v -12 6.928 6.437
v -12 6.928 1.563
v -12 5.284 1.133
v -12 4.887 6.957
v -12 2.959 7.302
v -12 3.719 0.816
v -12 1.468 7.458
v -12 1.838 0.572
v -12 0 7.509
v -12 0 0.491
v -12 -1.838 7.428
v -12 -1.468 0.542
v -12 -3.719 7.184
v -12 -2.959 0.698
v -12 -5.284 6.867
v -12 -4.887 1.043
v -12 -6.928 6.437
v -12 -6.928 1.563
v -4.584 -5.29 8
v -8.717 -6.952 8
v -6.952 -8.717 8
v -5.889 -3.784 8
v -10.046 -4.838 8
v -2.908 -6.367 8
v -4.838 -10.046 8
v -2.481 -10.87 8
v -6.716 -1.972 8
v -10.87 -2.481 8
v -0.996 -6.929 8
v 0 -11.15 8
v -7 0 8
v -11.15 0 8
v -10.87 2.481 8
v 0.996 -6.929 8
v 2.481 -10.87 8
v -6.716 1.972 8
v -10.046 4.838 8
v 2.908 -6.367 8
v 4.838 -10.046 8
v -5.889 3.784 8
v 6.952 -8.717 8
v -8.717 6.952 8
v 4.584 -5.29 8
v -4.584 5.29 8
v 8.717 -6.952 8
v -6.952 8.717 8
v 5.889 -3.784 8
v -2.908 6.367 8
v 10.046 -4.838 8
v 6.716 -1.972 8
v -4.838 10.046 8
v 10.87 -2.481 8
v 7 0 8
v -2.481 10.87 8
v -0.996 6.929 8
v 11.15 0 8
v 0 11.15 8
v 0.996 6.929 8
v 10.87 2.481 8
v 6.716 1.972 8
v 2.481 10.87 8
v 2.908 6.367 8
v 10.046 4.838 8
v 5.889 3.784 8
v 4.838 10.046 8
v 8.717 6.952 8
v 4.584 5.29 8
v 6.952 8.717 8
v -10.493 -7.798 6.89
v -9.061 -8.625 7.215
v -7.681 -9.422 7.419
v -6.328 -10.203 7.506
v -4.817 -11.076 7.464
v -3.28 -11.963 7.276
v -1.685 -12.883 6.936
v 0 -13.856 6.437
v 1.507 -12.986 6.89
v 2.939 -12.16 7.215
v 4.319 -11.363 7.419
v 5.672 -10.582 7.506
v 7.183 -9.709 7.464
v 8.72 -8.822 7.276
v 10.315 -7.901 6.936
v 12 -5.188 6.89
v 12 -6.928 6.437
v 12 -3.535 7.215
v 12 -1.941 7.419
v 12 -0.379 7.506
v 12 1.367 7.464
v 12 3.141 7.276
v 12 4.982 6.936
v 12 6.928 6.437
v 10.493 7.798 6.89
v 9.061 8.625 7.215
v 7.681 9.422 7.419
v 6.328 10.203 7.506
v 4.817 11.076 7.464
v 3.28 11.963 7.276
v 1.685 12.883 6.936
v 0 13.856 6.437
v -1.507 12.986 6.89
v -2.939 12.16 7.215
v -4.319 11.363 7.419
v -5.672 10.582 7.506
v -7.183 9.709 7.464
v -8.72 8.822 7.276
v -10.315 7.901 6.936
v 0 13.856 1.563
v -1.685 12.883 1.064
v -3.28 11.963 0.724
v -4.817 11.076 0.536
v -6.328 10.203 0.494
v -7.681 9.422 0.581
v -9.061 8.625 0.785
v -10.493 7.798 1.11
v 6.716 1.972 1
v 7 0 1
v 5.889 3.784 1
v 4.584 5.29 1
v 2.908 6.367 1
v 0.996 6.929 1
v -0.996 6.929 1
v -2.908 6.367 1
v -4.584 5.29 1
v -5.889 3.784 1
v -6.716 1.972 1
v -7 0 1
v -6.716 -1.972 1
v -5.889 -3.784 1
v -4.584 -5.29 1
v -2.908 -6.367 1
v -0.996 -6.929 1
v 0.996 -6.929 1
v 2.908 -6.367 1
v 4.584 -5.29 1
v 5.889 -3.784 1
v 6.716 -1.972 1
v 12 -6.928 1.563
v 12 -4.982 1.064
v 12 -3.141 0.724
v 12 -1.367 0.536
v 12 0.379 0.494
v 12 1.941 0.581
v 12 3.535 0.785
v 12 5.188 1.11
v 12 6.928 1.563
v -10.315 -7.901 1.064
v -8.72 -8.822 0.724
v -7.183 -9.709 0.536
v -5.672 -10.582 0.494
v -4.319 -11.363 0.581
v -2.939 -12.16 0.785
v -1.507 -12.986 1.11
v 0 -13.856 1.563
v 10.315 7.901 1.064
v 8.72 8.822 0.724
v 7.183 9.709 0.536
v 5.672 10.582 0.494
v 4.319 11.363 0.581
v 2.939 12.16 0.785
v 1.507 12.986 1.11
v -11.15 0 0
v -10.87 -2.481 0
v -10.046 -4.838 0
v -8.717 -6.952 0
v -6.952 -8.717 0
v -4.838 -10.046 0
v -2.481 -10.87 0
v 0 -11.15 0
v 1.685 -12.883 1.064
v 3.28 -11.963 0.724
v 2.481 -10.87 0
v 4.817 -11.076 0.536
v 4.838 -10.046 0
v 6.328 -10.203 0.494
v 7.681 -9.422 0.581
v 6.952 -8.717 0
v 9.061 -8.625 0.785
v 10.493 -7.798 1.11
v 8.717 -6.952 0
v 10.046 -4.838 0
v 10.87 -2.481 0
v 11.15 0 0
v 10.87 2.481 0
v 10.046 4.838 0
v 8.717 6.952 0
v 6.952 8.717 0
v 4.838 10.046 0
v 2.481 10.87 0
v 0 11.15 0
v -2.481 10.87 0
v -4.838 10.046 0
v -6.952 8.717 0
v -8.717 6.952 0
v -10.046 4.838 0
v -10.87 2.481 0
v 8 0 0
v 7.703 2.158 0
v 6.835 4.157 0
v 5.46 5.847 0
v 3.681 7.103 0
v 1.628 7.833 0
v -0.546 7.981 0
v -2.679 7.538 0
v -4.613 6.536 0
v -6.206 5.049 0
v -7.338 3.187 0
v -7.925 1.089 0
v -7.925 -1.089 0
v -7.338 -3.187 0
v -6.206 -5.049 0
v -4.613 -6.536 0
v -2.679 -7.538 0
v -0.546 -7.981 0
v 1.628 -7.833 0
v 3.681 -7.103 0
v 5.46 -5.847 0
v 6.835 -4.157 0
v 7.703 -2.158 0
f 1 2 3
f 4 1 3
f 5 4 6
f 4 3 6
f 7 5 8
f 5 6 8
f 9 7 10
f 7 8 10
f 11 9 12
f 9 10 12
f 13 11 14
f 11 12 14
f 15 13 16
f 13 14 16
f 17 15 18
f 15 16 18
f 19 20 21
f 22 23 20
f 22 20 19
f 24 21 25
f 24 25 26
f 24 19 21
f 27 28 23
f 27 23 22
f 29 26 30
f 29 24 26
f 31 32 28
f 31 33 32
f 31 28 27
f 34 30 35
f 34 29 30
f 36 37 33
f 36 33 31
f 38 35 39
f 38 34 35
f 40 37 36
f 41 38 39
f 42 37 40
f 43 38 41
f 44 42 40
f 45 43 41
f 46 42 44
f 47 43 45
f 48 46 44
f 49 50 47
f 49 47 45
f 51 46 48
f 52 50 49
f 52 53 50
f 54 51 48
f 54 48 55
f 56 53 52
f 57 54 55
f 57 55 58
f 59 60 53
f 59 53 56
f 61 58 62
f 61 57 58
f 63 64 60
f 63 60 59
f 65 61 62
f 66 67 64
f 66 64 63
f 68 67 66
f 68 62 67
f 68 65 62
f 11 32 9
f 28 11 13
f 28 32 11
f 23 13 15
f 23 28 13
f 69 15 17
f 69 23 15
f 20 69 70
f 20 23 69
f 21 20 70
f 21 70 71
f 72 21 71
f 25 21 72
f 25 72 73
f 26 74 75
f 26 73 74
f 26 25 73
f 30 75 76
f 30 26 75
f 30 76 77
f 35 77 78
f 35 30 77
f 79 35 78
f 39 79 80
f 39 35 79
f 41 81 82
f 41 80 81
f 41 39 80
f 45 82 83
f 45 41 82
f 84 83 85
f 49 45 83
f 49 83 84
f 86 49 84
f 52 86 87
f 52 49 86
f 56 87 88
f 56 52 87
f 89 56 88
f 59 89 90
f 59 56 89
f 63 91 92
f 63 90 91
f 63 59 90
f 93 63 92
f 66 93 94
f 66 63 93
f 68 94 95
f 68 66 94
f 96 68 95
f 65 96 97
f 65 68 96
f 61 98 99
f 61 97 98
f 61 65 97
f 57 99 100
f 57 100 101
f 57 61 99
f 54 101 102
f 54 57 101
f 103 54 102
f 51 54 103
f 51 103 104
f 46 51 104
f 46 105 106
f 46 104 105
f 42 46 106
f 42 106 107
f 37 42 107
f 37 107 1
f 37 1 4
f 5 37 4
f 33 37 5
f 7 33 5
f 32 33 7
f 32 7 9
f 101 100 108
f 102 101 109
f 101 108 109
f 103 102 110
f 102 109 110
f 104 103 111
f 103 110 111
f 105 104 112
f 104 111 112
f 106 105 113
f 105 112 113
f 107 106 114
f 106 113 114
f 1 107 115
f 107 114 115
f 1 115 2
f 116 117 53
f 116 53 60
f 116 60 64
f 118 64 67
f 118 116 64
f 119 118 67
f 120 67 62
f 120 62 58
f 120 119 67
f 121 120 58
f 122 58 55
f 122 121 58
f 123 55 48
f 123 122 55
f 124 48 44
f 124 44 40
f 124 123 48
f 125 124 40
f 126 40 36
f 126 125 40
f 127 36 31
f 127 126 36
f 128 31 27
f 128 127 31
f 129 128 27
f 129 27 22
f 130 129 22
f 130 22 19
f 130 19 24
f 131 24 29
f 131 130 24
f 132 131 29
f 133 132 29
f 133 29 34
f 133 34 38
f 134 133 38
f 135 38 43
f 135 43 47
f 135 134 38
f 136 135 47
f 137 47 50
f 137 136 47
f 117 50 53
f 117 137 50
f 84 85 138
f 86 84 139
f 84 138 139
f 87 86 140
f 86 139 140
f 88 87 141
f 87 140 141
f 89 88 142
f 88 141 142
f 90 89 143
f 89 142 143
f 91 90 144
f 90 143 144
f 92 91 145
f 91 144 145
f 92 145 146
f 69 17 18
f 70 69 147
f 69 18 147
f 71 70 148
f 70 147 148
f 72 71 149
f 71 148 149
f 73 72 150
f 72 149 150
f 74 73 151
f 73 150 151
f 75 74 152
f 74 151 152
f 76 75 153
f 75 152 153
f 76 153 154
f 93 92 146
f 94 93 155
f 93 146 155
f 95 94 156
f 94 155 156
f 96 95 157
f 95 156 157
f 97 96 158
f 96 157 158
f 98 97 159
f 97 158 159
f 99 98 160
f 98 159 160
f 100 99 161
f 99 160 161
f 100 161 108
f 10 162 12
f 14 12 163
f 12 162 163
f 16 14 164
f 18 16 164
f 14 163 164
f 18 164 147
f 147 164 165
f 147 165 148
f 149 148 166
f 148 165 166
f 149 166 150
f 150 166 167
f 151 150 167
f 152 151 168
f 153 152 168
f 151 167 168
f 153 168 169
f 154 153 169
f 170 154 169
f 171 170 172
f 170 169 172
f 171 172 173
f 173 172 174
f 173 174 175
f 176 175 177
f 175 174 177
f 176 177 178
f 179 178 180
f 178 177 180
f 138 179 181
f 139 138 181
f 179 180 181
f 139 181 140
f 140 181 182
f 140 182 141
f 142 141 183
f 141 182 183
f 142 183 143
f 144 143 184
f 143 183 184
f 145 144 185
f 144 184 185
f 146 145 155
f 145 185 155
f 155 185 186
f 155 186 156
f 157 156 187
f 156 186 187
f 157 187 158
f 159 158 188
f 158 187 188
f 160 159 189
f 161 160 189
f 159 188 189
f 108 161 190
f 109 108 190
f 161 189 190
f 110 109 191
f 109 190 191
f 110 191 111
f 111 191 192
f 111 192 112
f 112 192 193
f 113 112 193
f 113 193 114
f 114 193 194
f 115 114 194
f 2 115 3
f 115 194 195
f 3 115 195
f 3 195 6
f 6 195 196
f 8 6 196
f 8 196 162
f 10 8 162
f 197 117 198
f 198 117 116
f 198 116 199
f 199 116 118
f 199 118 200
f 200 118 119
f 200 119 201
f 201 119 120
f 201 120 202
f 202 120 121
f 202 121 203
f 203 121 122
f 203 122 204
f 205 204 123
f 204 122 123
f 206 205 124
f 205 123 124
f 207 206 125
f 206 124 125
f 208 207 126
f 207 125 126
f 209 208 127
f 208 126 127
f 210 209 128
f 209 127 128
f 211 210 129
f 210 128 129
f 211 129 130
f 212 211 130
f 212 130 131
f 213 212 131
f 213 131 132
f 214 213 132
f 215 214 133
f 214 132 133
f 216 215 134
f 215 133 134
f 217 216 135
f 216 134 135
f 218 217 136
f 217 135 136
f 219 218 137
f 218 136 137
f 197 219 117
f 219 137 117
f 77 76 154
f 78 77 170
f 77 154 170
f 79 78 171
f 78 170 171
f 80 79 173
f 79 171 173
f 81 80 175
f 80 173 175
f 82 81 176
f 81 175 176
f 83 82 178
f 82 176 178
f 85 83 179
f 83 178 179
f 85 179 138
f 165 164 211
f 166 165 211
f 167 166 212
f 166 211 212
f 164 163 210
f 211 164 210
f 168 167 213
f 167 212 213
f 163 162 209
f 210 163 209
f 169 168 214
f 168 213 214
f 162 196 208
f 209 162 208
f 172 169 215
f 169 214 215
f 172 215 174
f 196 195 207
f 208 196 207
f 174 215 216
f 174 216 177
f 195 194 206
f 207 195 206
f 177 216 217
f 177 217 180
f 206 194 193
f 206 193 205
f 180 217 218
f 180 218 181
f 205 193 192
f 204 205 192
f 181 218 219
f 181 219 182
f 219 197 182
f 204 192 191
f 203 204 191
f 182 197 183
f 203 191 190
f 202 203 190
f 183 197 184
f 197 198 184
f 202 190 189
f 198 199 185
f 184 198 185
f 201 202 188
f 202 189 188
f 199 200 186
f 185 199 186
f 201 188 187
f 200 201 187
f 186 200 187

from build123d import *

# Parameters (mm, degrees)
SKETCH_1_R      = 7
EXTRUDE_1_DEPTH = 8
CHAMFER_1_SIZE  = 1


with BuildPart() as part:
    # Эскиз1 → Бобышка-Вытянуть1 (new body)
    with BuildSketch(Plane.XY):
        Polygon((0, 13.856406461), (-12, 6.92820323), (-12, -6.92820323), (0, -13.856406461), (12, -6.92820323), (12, 6.92820323), align=None)
        Circle(SKETCH_1_R, mode=Mode.SUBTRACT)
    extrude(amount=EXTRUDE_1_DEPTH)

    # Эскиз2 → Вырез-Повернуть1 (revolve, cut)
    with BuildSketch(Plane(origin=(0, 0, 0), x_dir=(0, 0, -1), z_dir=(1, 0, 0)), mode=Mode.PRIVATE) as cut_revolve_1_sk:
        Polygon((0, 13.856406461), (-1.562544499, 13.856406461), (0, 11.15), align=None)
        Polygon((-8, 11.15), (-8, 13.856406461), (-6.437455501, 13.856406461), align=None)
    revolve(cut_revolve_1_sk.sketch.rotate(Axis((0, 0, 0), (0, 0, 1)), 90), axis=Axis((0, 0, 0), (0, 0, 1)), mode=Mode.SUBTRACT)

    # Фаска1
    chamfer_1_edges = [part.edges().sort_by_distance(p)[0] for p in [
        (-7, 0, 0),
    ]]
    chamfer(chamfer_1_edges, length=CHAMFER_1_SIZE)


solid = part.part
